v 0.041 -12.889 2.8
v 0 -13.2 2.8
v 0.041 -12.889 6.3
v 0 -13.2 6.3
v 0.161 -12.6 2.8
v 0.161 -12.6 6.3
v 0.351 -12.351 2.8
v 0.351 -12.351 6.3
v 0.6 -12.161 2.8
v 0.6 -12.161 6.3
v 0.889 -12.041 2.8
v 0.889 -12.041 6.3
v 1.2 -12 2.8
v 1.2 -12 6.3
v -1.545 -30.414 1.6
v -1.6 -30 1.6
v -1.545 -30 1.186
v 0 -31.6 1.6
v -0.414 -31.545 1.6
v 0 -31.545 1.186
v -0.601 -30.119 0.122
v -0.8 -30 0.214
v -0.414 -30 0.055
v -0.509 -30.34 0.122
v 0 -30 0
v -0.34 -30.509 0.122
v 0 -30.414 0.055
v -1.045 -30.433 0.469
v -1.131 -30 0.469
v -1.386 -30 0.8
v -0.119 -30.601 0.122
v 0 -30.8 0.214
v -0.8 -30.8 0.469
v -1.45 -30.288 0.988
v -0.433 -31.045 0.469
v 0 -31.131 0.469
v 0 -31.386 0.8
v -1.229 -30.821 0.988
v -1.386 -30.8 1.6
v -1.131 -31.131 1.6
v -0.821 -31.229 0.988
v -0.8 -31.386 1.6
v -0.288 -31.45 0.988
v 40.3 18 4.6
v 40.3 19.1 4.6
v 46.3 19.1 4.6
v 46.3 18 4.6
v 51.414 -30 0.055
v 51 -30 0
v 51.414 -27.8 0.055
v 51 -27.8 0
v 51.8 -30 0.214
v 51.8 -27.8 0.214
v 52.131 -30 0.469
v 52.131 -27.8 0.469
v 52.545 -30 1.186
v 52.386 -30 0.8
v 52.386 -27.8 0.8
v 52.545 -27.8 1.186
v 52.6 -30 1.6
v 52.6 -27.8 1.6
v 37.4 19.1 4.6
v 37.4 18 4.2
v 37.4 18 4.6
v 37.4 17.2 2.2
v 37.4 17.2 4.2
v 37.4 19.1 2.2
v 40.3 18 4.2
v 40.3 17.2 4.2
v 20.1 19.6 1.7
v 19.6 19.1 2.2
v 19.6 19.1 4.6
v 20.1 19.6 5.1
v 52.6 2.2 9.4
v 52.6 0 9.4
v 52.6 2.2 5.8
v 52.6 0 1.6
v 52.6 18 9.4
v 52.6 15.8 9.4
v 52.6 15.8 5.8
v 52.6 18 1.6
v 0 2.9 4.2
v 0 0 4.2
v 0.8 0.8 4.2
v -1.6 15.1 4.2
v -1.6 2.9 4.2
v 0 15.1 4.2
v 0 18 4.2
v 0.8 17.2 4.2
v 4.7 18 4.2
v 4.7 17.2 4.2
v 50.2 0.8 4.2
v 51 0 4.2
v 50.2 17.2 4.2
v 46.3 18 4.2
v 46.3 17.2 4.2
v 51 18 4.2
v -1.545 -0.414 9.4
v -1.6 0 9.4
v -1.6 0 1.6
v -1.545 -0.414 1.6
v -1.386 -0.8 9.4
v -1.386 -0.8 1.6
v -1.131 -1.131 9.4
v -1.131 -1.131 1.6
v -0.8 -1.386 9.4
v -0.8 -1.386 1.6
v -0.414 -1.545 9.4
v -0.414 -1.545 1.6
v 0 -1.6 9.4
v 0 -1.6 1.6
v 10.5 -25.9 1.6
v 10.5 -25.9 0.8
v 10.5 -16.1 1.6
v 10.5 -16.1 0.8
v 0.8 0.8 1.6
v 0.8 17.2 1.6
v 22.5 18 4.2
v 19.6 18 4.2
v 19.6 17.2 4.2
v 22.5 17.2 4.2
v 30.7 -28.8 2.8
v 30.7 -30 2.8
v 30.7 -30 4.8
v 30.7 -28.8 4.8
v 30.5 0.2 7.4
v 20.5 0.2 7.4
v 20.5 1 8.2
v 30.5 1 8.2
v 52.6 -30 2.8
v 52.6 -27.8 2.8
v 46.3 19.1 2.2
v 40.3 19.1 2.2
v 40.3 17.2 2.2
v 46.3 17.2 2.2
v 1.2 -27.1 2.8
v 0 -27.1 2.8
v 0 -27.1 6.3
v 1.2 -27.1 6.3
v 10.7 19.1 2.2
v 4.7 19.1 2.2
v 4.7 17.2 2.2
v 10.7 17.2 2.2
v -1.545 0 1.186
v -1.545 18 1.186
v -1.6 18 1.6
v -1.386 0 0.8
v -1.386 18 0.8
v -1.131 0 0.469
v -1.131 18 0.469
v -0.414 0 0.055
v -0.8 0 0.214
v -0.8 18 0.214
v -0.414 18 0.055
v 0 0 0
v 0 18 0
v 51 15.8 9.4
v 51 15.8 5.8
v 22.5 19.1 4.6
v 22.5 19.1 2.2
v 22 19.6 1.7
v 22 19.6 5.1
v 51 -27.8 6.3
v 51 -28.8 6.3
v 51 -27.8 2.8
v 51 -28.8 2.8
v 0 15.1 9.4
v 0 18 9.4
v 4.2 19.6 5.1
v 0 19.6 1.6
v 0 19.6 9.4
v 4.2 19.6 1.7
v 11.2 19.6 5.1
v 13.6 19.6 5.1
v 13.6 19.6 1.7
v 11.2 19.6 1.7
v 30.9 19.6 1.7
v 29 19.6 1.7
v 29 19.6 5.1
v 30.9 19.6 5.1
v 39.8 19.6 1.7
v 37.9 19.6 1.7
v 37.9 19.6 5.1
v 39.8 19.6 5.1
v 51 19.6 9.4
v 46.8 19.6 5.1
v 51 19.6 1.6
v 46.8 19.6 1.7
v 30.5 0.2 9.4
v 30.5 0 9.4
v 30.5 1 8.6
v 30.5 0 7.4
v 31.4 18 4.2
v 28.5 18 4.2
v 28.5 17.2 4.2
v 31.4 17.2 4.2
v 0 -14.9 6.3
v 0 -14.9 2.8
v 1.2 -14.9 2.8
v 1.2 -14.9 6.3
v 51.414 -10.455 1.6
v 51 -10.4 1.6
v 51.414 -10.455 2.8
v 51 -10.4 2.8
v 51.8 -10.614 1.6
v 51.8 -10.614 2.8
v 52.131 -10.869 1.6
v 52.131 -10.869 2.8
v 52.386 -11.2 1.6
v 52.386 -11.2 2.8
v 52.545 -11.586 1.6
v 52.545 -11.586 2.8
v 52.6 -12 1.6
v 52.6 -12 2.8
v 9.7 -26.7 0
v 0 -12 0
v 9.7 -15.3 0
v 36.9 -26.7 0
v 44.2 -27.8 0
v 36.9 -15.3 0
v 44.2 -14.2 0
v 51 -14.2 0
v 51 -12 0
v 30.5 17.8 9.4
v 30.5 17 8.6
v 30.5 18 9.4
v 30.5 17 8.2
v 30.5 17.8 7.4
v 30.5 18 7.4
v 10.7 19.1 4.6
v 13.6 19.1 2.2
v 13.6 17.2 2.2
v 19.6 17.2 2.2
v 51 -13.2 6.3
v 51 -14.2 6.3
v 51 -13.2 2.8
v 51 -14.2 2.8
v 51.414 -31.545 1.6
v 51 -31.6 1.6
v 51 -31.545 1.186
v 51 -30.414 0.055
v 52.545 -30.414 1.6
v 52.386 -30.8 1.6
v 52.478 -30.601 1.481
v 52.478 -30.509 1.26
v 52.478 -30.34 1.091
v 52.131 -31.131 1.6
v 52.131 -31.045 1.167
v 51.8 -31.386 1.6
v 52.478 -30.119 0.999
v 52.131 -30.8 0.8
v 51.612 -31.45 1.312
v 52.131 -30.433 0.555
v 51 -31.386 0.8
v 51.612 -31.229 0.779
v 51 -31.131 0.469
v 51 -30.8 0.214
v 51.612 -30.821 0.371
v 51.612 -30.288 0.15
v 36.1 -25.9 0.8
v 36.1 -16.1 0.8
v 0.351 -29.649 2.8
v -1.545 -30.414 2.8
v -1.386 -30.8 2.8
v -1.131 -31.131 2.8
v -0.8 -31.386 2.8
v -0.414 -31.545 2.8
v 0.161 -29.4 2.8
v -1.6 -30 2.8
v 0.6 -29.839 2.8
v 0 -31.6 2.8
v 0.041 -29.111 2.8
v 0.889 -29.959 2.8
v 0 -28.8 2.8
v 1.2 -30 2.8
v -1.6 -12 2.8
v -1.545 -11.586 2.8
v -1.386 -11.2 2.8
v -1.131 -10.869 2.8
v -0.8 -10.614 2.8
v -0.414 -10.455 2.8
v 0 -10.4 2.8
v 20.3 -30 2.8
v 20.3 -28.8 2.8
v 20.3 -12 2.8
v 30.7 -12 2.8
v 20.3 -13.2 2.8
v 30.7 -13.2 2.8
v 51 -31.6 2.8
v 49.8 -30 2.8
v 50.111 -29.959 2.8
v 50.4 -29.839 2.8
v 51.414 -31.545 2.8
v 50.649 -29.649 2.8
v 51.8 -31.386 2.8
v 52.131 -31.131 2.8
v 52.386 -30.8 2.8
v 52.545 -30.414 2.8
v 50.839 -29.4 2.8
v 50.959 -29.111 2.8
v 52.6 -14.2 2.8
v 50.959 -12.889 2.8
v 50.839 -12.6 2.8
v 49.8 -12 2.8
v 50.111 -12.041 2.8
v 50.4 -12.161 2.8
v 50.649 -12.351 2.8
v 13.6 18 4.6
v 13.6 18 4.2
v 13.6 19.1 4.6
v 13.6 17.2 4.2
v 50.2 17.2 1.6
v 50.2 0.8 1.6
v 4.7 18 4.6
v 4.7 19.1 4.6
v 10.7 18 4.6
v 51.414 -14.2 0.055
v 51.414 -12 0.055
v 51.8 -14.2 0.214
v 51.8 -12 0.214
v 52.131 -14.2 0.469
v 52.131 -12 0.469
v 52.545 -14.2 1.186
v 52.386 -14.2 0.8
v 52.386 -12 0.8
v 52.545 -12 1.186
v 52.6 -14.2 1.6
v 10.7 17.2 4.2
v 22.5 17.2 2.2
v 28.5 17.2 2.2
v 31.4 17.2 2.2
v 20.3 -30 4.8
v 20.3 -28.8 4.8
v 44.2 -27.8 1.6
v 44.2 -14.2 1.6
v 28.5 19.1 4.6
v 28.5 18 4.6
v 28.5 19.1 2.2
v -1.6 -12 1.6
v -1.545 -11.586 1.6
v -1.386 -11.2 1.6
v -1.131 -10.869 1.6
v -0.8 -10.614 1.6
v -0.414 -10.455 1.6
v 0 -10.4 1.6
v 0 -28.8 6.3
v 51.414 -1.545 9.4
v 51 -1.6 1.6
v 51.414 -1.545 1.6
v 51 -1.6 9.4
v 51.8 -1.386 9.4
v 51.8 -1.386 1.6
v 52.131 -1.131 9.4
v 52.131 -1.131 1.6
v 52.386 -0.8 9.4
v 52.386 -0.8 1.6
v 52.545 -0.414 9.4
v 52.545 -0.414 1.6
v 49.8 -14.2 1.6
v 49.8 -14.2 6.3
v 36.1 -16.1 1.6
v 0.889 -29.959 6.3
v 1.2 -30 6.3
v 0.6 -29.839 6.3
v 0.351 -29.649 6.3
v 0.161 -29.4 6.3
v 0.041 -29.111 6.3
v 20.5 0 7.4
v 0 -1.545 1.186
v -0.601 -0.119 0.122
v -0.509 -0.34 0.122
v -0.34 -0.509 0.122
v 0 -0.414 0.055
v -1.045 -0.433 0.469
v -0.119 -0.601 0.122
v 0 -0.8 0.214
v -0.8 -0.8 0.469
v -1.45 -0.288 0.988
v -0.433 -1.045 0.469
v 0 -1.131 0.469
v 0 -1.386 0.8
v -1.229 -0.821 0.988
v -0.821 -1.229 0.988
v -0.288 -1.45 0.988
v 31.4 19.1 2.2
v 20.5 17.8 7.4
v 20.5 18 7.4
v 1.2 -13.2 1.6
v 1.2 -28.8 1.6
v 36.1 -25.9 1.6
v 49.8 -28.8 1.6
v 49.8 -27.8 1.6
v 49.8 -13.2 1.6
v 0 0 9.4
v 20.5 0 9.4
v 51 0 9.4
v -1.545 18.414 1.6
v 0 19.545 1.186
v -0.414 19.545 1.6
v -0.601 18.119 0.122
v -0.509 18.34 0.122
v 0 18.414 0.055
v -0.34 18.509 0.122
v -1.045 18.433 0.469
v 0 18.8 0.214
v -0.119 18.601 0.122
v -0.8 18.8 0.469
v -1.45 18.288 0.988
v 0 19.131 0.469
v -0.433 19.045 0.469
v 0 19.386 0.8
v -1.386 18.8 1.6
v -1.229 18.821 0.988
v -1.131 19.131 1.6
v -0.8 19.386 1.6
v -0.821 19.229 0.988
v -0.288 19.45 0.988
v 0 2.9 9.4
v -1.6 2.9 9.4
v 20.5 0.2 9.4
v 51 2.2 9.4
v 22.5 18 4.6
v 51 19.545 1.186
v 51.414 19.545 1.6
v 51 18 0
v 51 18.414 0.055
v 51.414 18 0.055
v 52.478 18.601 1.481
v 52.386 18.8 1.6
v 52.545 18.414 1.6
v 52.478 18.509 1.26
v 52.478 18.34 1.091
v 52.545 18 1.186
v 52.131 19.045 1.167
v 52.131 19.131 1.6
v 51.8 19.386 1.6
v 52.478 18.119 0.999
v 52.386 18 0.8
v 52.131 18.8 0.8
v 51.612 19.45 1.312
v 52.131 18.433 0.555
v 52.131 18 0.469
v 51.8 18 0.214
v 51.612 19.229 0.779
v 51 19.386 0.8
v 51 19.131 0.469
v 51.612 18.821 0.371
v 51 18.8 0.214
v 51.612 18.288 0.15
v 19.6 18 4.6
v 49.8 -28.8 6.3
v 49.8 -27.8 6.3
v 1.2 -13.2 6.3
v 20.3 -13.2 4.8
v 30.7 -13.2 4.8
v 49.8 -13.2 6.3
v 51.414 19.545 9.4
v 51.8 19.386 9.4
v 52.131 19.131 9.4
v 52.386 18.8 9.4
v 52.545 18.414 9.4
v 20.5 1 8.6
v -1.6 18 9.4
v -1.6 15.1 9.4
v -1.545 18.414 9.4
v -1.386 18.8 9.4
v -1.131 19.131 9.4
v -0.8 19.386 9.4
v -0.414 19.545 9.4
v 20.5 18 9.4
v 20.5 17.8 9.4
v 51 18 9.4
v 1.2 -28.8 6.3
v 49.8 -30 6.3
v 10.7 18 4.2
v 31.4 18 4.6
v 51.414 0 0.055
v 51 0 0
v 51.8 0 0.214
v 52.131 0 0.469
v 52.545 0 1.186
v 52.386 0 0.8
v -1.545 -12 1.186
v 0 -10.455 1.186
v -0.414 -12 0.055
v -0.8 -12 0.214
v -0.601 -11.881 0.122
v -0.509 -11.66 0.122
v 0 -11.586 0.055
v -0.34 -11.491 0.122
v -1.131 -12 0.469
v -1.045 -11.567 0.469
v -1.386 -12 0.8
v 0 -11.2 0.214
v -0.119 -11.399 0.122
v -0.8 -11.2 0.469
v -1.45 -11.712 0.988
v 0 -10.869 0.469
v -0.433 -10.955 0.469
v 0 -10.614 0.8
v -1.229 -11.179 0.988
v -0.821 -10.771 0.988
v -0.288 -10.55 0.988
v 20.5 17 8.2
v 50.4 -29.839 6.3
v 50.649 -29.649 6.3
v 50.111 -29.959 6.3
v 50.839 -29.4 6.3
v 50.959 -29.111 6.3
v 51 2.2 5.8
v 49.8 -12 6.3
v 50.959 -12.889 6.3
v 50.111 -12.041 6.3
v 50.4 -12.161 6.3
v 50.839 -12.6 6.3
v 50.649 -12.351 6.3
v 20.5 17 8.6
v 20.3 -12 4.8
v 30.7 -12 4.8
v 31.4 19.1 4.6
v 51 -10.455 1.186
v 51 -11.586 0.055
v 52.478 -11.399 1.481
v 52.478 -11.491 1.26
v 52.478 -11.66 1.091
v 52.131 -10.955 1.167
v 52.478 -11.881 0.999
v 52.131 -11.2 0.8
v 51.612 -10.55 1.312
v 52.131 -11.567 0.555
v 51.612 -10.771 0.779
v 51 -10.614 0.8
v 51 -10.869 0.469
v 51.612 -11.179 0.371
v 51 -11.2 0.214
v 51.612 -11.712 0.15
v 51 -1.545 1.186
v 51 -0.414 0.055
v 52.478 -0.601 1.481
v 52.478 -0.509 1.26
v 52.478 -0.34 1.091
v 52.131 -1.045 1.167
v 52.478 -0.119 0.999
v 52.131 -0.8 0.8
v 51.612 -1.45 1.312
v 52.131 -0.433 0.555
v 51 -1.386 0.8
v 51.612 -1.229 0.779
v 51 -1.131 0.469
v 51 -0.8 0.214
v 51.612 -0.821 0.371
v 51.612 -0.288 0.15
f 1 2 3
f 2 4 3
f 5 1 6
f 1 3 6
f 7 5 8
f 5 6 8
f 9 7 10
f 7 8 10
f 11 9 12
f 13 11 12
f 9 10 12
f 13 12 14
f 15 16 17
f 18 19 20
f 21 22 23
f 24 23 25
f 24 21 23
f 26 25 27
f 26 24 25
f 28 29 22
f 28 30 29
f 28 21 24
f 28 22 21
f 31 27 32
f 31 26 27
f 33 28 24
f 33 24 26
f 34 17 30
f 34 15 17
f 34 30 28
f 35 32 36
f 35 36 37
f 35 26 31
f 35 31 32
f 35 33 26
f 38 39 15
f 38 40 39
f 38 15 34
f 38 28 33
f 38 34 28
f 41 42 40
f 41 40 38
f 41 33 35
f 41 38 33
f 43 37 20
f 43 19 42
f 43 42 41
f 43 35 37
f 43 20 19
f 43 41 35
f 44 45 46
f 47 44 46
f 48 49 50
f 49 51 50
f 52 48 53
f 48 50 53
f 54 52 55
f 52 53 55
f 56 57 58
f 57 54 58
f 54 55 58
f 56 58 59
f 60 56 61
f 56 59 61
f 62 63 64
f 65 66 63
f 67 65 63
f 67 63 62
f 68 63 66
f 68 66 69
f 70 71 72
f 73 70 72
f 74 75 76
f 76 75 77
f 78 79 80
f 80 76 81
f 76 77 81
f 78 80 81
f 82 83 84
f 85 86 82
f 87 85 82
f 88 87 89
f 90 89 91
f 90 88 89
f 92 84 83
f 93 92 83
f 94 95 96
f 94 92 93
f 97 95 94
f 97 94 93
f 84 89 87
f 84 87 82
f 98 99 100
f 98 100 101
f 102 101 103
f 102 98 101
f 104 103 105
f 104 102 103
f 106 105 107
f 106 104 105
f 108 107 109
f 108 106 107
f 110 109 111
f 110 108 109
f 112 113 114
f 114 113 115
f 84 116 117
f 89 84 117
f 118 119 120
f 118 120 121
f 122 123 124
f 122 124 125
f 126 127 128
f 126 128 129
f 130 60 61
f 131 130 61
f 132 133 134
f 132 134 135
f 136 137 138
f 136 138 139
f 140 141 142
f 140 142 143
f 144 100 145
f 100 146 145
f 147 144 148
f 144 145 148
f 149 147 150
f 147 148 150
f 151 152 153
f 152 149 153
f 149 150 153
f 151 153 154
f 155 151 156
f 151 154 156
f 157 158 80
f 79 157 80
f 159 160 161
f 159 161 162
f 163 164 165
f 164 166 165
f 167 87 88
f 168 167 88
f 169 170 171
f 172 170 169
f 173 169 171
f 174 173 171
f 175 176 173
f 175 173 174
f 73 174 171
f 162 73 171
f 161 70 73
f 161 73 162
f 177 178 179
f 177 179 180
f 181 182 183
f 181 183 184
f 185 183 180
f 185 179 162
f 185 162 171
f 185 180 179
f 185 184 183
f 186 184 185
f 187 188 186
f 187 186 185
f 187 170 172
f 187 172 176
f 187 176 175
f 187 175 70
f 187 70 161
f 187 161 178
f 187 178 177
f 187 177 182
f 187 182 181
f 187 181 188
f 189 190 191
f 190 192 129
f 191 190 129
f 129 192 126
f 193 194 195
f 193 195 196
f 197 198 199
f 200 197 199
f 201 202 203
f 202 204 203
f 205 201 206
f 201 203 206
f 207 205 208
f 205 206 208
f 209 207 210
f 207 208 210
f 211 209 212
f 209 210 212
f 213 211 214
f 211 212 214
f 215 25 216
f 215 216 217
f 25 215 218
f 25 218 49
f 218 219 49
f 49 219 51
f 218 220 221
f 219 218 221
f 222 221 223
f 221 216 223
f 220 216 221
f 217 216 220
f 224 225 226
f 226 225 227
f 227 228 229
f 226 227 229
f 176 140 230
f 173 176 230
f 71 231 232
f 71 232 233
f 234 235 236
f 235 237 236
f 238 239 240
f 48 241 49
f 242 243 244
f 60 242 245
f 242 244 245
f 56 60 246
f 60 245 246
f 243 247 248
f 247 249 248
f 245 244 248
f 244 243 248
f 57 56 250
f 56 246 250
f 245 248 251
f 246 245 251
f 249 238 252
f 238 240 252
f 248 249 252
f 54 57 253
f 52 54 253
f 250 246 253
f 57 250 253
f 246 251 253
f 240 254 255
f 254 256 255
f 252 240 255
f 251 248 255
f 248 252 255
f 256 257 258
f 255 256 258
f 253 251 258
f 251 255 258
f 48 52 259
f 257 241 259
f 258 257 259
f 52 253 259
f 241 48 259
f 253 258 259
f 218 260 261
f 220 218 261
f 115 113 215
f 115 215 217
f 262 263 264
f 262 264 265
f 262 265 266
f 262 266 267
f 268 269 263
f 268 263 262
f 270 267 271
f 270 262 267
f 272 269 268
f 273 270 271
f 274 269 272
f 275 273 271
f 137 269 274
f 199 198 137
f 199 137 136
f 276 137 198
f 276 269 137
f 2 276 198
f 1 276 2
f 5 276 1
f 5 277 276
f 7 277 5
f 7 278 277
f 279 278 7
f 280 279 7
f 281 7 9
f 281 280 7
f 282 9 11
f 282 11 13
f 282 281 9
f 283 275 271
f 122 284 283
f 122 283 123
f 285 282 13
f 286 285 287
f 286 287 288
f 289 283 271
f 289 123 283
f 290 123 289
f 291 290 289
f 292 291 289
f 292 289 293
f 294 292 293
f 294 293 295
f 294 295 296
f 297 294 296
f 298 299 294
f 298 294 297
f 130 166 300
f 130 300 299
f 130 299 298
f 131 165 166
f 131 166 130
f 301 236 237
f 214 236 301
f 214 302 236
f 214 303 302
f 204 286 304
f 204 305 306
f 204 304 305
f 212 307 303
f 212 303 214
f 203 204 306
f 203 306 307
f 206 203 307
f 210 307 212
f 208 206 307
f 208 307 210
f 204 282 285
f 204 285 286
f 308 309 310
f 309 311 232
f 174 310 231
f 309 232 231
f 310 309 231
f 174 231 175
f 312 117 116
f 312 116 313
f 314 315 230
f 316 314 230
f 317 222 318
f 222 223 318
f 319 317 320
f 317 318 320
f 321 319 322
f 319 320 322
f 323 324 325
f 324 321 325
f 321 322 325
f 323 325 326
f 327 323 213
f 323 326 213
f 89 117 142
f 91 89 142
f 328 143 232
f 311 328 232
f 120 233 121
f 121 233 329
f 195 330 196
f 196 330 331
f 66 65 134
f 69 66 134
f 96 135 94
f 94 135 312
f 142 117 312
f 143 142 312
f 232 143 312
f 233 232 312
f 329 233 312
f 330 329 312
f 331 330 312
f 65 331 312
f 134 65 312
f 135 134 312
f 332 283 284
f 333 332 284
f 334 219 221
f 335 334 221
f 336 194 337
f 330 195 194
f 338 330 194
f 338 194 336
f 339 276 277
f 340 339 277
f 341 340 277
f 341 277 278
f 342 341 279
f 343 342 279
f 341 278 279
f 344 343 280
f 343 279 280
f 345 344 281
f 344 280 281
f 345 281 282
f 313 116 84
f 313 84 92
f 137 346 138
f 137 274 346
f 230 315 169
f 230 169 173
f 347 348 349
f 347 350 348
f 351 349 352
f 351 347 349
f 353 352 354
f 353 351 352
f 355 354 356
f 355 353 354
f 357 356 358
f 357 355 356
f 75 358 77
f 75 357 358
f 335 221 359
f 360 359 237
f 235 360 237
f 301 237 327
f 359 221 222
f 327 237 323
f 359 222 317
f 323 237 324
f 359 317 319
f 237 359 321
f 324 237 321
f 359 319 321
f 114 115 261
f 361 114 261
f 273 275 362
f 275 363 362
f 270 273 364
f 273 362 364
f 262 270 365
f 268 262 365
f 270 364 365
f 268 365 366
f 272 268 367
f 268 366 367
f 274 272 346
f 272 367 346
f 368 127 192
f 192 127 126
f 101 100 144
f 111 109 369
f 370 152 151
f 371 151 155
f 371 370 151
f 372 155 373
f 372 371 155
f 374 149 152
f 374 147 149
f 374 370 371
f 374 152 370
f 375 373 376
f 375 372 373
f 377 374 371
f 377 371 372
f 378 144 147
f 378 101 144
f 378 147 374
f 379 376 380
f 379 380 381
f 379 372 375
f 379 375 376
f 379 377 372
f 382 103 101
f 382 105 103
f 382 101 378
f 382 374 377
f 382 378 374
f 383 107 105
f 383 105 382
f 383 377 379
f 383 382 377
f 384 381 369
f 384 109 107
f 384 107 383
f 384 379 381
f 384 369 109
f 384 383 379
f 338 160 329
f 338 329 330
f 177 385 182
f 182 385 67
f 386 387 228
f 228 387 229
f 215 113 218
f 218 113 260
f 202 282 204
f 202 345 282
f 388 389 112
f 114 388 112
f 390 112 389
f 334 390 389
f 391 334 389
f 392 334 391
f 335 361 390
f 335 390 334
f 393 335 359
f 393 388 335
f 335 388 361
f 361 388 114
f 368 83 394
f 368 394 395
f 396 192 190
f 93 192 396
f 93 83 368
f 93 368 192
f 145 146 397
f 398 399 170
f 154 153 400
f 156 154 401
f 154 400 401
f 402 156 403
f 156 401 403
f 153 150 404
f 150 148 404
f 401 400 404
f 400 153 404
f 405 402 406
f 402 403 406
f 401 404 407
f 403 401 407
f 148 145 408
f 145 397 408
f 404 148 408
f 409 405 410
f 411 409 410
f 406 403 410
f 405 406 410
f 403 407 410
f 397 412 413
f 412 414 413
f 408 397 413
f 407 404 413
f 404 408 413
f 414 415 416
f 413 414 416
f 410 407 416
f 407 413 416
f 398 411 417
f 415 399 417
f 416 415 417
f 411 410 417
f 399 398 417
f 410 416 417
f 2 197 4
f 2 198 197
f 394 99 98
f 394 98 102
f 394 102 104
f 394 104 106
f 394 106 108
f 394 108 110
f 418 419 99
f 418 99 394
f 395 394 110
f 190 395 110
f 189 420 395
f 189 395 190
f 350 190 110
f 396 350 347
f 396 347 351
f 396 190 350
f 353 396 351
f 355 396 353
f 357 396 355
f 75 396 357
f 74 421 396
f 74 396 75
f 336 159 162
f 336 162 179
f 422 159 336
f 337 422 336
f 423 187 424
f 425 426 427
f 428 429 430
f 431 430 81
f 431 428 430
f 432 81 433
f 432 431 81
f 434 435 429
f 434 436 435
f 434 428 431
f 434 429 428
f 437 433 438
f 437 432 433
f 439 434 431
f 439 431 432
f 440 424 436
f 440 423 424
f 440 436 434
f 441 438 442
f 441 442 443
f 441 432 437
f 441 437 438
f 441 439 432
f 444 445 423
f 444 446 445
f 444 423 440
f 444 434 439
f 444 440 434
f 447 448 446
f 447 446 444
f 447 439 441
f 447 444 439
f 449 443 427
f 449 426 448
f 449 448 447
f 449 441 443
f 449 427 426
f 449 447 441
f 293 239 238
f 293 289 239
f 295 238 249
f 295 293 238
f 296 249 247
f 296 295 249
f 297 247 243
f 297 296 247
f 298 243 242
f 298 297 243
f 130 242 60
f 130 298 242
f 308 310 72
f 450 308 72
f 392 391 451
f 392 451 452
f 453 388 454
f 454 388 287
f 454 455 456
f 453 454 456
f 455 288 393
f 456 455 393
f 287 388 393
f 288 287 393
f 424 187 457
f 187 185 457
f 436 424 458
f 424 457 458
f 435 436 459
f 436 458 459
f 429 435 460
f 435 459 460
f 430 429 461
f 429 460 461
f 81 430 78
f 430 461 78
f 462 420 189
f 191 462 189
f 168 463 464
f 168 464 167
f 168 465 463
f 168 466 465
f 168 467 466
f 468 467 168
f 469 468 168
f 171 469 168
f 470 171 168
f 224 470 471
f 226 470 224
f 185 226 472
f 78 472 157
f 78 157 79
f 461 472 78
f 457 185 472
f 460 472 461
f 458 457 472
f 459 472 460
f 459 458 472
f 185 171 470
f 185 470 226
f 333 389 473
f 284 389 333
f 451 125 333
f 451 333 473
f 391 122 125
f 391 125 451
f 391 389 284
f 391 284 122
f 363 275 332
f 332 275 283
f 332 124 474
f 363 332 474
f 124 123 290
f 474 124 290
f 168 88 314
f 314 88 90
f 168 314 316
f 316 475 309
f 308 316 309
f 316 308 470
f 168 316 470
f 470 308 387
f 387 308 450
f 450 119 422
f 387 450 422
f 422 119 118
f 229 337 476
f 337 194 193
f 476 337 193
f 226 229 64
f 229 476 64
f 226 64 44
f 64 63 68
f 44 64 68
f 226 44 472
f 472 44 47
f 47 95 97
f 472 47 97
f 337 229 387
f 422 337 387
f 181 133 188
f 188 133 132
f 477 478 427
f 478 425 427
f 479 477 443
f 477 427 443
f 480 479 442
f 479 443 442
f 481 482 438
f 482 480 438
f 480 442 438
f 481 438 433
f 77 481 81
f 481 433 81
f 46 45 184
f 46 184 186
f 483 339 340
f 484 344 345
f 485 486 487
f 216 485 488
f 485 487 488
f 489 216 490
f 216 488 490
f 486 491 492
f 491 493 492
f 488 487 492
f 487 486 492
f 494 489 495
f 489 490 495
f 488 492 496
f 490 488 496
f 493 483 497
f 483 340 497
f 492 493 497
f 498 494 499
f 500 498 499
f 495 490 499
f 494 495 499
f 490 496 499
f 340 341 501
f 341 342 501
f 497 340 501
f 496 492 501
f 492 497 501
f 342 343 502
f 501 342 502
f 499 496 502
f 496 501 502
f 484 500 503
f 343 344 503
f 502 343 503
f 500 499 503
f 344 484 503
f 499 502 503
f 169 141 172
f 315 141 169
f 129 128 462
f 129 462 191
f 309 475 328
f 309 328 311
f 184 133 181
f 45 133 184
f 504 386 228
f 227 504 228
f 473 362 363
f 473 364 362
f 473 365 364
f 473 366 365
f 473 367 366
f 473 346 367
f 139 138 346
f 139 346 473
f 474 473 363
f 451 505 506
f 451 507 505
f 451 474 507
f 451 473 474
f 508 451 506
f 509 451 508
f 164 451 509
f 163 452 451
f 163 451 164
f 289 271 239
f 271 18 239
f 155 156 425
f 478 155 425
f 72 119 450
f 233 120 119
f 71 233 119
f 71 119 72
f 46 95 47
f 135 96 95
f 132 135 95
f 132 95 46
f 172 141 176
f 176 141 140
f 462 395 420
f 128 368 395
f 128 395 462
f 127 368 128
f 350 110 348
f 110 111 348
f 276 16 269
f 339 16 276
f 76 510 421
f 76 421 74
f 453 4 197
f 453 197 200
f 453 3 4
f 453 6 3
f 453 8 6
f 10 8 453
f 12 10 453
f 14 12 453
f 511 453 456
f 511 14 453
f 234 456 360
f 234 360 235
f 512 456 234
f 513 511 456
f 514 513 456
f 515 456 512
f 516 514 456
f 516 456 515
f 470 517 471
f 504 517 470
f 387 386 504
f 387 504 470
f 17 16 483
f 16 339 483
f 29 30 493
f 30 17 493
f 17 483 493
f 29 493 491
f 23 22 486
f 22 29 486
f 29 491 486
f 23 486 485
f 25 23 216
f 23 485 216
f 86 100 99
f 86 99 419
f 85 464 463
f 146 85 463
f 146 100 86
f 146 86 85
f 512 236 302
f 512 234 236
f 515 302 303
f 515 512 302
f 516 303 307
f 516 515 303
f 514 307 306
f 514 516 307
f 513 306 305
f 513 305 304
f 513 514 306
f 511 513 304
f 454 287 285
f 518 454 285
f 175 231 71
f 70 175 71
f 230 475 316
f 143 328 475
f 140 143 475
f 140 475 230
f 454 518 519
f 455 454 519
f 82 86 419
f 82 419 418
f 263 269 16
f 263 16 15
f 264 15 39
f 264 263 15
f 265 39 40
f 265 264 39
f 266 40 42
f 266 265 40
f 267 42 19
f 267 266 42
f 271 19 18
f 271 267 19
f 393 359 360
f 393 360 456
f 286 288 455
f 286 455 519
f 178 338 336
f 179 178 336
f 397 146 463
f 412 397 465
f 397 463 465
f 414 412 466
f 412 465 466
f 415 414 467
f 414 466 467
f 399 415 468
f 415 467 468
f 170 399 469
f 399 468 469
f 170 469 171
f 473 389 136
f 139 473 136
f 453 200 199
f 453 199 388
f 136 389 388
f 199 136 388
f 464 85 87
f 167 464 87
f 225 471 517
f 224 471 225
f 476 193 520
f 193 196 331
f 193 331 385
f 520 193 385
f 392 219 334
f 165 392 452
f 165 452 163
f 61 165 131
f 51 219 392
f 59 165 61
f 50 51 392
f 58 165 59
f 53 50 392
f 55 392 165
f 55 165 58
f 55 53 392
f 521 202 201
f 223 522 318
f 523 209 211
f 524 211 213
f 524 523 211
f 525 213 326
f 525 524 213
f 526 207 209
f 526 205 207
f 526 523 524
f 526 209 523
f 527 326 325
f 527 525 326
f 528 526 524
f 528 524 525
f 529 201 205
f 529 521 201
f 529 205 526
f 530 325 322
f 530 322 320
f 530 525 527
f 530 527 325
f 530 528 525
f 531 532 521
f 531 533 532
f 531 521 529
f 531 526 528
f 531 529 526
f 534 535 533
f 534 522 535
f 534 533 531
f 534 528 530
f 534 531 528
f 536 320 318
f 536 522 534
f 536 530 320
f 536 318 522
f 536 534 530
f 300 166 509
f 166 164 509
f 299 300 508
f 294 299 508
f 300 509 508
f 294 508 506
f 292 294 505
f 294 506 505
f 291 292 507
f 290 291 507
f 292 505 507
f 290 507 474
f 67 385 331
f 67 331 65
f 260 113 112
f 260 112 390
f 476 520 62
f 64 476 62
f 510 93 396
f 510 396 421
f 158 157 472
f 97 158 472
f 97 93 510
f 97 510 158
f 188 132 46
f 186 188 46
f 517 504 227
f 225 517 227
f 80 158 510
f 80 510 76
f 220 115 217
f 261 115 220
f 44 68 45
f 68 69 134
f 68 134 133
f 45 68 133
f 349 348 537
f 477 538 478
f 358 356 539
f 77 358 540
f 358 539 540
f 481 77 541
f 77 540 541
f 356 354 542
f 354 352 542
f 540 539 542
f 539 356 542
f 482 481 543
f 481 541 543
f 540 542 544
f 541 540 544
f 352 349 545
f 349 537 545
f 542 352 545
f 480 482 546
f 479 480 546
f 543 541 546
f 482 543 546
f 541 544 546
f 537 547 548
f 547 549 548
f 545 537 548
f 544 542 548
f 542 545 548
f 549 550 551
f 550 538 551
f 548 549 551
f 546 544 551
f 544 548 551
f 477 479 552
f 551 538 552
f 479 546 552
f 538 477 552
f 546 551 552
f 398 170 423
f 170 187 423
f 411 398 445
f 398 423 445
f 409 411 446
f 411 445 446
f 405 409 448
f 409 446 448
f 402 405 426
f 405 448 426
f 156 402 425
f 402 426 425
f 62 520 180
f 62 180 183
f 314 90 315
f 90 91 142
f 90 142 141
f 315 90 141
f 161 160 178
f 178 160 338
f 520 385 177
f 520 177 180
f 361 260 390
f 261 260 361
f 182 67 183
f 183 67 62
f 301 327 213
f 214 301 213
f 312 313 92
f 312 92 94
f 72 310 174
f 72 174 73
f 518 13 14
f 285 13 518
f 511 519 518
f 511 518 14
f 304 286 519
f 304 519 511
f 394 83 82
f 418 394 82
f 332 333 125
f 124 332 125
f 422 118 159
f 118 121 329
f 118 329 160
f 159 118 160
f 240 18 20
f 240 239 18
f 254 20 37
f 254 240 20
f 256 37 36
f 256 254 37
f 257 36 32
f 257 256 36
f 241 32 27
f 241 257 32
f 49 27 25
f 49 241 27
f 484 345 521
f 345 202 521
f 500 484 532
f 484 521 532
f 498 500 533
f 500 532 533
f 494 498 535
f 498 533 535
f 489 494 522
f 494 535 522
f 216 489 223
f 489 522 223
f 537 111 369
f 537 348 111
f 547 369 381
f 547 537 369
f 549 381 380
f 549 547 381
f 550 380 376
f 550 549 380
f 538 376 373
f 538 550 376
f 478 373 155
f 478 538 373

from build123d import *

# Parameters (mm, degrees)
BOX007_W        = 10
BOX007_H        = 13.6
BOX007_DEPTH    = 10
BOX008_W        = 6
BOX008_H        = 10
BOX008_DEPTH    = 2.4
BOX009_W        = 6
BOX009_H        = 10
BOX009_DEPTH    = 2.4
BOX019_W        = 6
BOX019_H        = 10
BOX019_DEPTH    = 2.4
BOX020_W        = 6
BOX020_H        = 10
BOX020_DEPTH    = 2.4
BOX021_W        = 6
BOX021_H        = 10
BOX021_DEPTH    = 2.4
BOX006_W        = 10
BOX006_H        = 12.2
BOX006_DEPTH    = 5.2
BOX003_W        = 49.4
BOX003_H        = 16.4
BOX003_DEPTH    = 2.6
BOX002_W        = 51
BOX002_H        = 18
BOX002_DEPTH    = 2.6
BOX005_W        = 10
BOX005_H        = 1
BOX005_DEPTH    = 2
CHAMFER001_SIZE = 0.8
BOX004_W        = 10
BOX004_H        = 1
BOX004_DEPTH    = 2
CHAMFER_SIZE    = 0.8
BOX001_W        = 51
BOX001_H        = 18
BOX001_DEPTH    = 9.4
BOX_W           = 54.2
BOX_H           = 21.2
BOX_DEPTH       = 9.4
FILLET_R        = 1.6
CHAMFER002_SIZE = 0.5
BOX015_W        = 10
BOX015_H        = 12.2
BOX015_DEPTH    = 5.2
BOX016_W        = 10
BOX016_H        = 13.6
BOX016_DEPTH    = 10
BOX017_W        = 10.4
BOX017_H        = 5
BOX017_DEPTH    = 2
BOX018_W        = 10.4
BOX018_H        = 5
BOX018_DEPTH    = 2
BOX014_W        = 25.6
BOX014_H        = 9.8
BOX014_DEPTH    = 1.6
BOX013_W        = 48.6
BOX013_H        = 15.6
BOX013_DEPTH    = 4.8
BOX012_W        = 51
BOX012_H        = 18
BOX012_DEPTH    = 4.7
BOX011_W        = 51
BOX011_H        = 18
BOX011_DEPTH    = 9.4
BOX010_W        = 54.2
BOX010_H        = 21.2
BOX010_DEPTH    = 2.8
FILLET001_R     = 1.6
CHAMFER003_SIZE = 0.8
FILLET002_R     = 1.2


with BuildPart() as usb_buchse:
    # Box007 → Box007 (new body)
    with BuildSketch(Plane(origin=(48, 2.2, 5.8), x_dir=(1, 0, 0), z_dir=(0, 0, 1))):
        with Locations((5, 6.8)):
            Rectangle(BOX007_W, BOX007_H)
    extrude(amount=BOX007_DEPTH)


with BuildPart() as button1:
    # Box008 → Box008 (new body)
    with BuildSketch(Plane(origin=(4.7, 14, 2.2), x_dir=(1, 0, 0), z_dir=(0, 0, 1))):
        with Locations((3, 5)):
            Rectangle(BOX008_W, BOX008_H)
    extrude(amount=BOX008_DEPTH)


with BuildPart() as button2:
    # Box009 → Box009 (new body)
    with BuildSketch(Plane(origin=(13.6, 14, 2.2), x_dir=(1, 0, 0), z_dir=(0, 0, 1))):
        with Locations((3, 5)):
            Rectangle(BOX009_W, BOX009_H)
    extrude(amount=BOX009_DEPTH)


with BuildPart() as button3:
    # Box019 → Box019 (new body)
    with BuildSketch(Plane(origin=(22.5, 14, 2.2), x_dir=(1, 0, 0), z_dir=(0, 0, 1))):
        with Locations((3, 5)):
            Rectangle(BOX019_W, BOX019_H)
    extrude(amount=BOX019_DEPTH)


with BuildPart() as button4:
    # Box020 → Box020 (new body)
    with BuildSketch(Plane(origin=(31.4, 14, 2.2), x_dir=(1, 0, 0), z_dir=(0, 0, 1))):
        with Locations((3, 5)):
            Rectangle(BOX020_W, BOX020_H)
    extrude(amount=BOX020_DEPTH)


with BuildPart() as button5:
    # Box021 → Box021 (new body)
    with BuildSketch(Plane(origin=(40.3, 14, 2.2), x_dir=(1, 0, 0), z_dir=(0, 0, 1))):
        with Locations((3, 5)):
            Rectangle(BOX021_W, BOX021_H)
    extrude(amount=BOX021_DEPTH)


with BuildPart() as bottom_cutouts:
    # Box006 → Box006 (new body)
    with BuildSketch(Plane(origin=(-5, 2.9, 4.2), x_dir=(1, 0, 0), z_dir=(0, 0, 1))):
        with Locations((5, 6.1)):
            Rectangle(BOX006_W, BOX006_H)
    extrude(amount=BOX006_DEPTH)

    # Fusion001: union USB_Buchse, Button1, Button2, Button3, Button4, Button5
    add(usb_buchse.part)
    add(button1.part)
    add(button2.part)
    add(button3.part)
    add(button4.part)
    add(button5.part)


with BuildPart() as auflage_innen:
    # Box003 → Box003 (new body)
    with BuildSketch(Plane(origin=(0.8, 0.8, 1.6), x_dir=(1, 0, 0), z_dir=(0, 0, 1))):
        with Locations((24.7, 8.2)):
            Rectangle(BOX003_W, BOX003_H)
    extrude(amount=BOX003_DEPTH)


with BuildPart() as auflage:
    # Box002 → Box002 (new body)
    with BuildSketch(Plane.XY.offset(1.6)):
        with Locations((25.5, 9)):
            Rectangle(BOX002_W, BOX002_H)
    extrude(amount=BOX002_DEPTH)

    # Cut001: cut Auflage_innen
    add(auflage_innen.part, mode=Mode.SUBTRACT)


with BuildPart() as haken2:
    # Box005 → Box005 (new body)
    with BuildSketch(Plane(origin=(20.5, 17, 7.4), x_dir=(1, 0, 0), z_dir=(0, 0, 1))):
        with Locations((5, 0.5)):
            Rectangle(BOX005_W, BOX005_H)
    extrude(amount=BOX005_DEPTH)

    # Chamfer001
    chamfer001_edges = [haken2.edges().sort_by_distance(p)[0] for p in [
        (25.5, 17, 7.4),
        (25.5, 17, 9.4),
    ]]
    chamfer(chamfer001_edges, length=CHAMFER001_SIZE)


with BuildPart() as haken1:
    # Box004 → Box004 (new body)
    with BuildSketch(Plane(origin=(20.5, 0, 7.4), x_dir=(1, 0, 0), z_dir=(0, 0, 1))):
        with Locations((5, 0.5)):
            Rectangle(BOX004_W, BOX004_H)
    extrude(amount=BOX004_DEPTH)

    # Chamfer
    chamfer_edges = [haken1.edges().sort_by_distance(p)[0] for p in [
        (25.5, 1, 7.4),
        (25.5, 1, 9.4),
    ]]
    chamfer(chamfer_edges, length=CHAMFER_SIZE)


with BuildPart() as unten_innen:
    # Box001 → Box001 (new body)
    with BuildSketch(Plane.XY.offset(1.6)):
        with Locations((25.5, 9)):
            Rectangle(BOX001_W, BOX001_H)
    extrude(amount=BOX001_DEPTH)


with BuildPart() as case_bottom:
    # Box → Box (new body)
    with BuildSketch(Plane(origin=(-1.6, -1.6, 0), x_dir=(1, 0, 0), z_dir=(0, 0, 1))):
        with Locations((27.1, 10.6)):
            Rectangle(BOX_W, BOX_H)
    extrude(amount=BOX_DEPTH)

    # Cut: cut unten_innen
    add(unten_innen.part, mode=Mode.SUBTRACT)

    # Fillet
    fillet_edges = [case_bottom.edges().sort_by_distance(p)[0] for p in [
        (-1.6, -1.6, 4.7),
        (-1.6, 19.6, 4.7),
        (-1.6, 9, 0),
        (25.5, -1.6, 0),
        (52.6, -1.6, 4.7),
        (25.5, 19.6, 0),
        (52.6, 19.6, 4.7),
        (52.6, 9, 0),
    ]]
    fillet(fillet_edges, radius=FILLET_R)

    # Fusion: union Auflage, Haken2, Haken1
    add(auflage.part)
    add(haken2.part)
    add(haken1.part)

    # Cut004: cut bottom_cutouts
    add(bottom_cutouts.part, mode=Mode.SUBTRACT)

    # Chamfer002
    chamfer002_edges = [case_bottom.edges().sort_by_distance(p)[0] for p in [
        (43.3, 19.6, 4.6),
        (46.3, 19.6, 3.4),
        (43.3, 19.6, 2.2),
        (40.3, 19.6, 3.4),
        (34.4, 19.6, 4.6),
        (37.4, 19.6, 3.4),
        (34.4, 19.6, 2.2),
        (31.4, 19.6, 3.4),
        (16.6, 19.6, 4.6),
        (19.6, 19.6, 3.4),
        (16.6, 19.6, 2.2),
        (25.5, 19.6, 4.6),
        (28.5, 19.6, 3.4),
        (25.5, 19.6, 2.2),
        (22.5, 19.6, 3.4),
        (7.7, 19.6, 4.6),
        (10.7, 19.6, 3.4),
        (7.7, 19.6, 2.2),
        (4.7, 19.6, 3.4),
    ]]
    chamfer(chamfer002_edges, length=CHAMFER002_SIZE)


with BuildPart() as usb_stecker2:
    # Box015 → Box015 (new body)
    with BuildSketch(Plane(origin=(-5, -27.1, 2.8), x_dir=(1, 0, 0), z_dir=(0, 0, 1))):
        with Locations((5, 6.1)):
            Rectangle(BOX015_W, BOX015_H)
    extrude(amount=BOX015_DEPTH)


with BuildPart() as usb_buchse2:
    # Box016 → Box016 (new body)
    with BuildSketch(Plane(origin=(44.2, -27.8, 0), x_dir=(1, 0, 0), z_dir=(0, 0, 1))):
        with Locations((5, 6.8)):
            Rectangle(BOX016_W, BOX016_H)
    extrude(amount=BOX016_DEPTH)


with BuildPart() as oese1:
    # Box017 → Box017 (new body)
    with BuildSketch(Plane(origin=(20.3, -33, 2.8), x_dir=(1, 0, 0), z_dir=(0, 0, 1))):
        with Locations((5.2, 2.5)):
            Rectangle(BOX017_W, BOX017_H)
    extrude(amount=BOX017_DEPTH)


with BuildPart() as oese2:
    # Box018 → Box018 (new body)
    with BuildSketch(Plane(origin=(20.3, -15, 2.8), x_dir=(1, 0, 0), z_dir=(0, 0, 1))):
        with Locations((5.2, 2.5)):
            Rectangle(BOX018_W, BOX018_H)
    extrude(amount=BOX018_DEPTH)


with BuildPart() as top_cutouts:
    # Box014 → Box014 (new body)
    with BuildSketch(Plane(origin=(10.5, -25.9, 0), x_dir=(1, 0, 0), z_dir=(0, 0, 1))):
        with Locations((12.8, 4.9)):
            Rectangle(BOX014_W, BOX014_H)
    extrude(amount=BOX014_DEPTH)

    # Fusion003: union USB_Stecker2, USB_Buchse2, Oese1, Oese2
    add(usb_stecker2.part)
    add(usb_buchse2.part)
    add(oese1.part)
    add(oese2.part)


with BuildPart() as rahmen_innen:
    # Box013 → Box013 (new body)
    with BuildSketch(Plane(origin=(1.2, -28.8, 1.6), x_dir=(1, 0, 0), z_dir=(0, 0, 1))):
        with Locations((24.3, 7.8)):
            Rectangle(BOX013_W, BOX013_H)
    extrude(amount=BOX013_DEPTH)


with BuildPart() as rahmen:
    # Box012 → Box012 (new body)
    with BuildSketch(Plane(origin=(0, -30, 1.6), x_dir=(1, 0, 0), z_dir=(0, 0, 1))):
        with Locations((25.5, 9)):
            Rectangle(BOX012_W, BOX012_H)
    extrude(amount=BOX012_DEPTH)

    # Cut003: cut Rahmen_innen
    add(rahmen_innen.part, mode=Mode.SUBTRACT)


with BuildPart() as oben_innen:
    # Box011 → Box011 (new body)
    with BuildSketch(Plane(origin=(0, -30, 1.6), x_dir=(1, 0, 0), z_dir=(0, 0, 1))):
        with Locations((25.5, 9)):
            Rectangle(BOX011_W, BOX011_H)
    extrude(amount=BOX011_DEPTH)


with BuildPart() as case_top:
    # Box010 → Box010 (new body)
    with BuildSketch(Plane(origin=(-1.6, -31.6, 0), x_dir=(1, 0, 0), z_dir=(0, 0, 1))):
        with Locations((27.1, 10.6)):
            Rectangle(BOX010_W, BOX010_H)
    extrude(amount=BOX010_DEPTH)

    # Cut002: cut oben_innen
    add(oben_innen.part, mode=Mode.SUBTRACT)

    # Fillet001
    fillet001_edges = [case_top.edges().sort_by_distance(p)[0] for p in [
        (-1.6, -31.6, 1.4),
        (-1.6, -10.4, 1.4),
        (-1.6, -21, 0),
        (25.5, -31.6, 0),
        (52.6, -31.6, 1.4),
        (25.5, -10.4, 0),
        (52.6, -10.4, 1.4),
        (52.6, -21, 0),
    ]]
    fillet(fillet001_edges, radius=FILLET001_R)

    # Fusion002: union Rahmen
    add(rahmen.part)

    # Cut005: cut top_cutouts
    add(top_cutouts.part, mode=Mode.SUBTRACT)

    # Chamfer003
    chamfer003_edges = [case_top.edges().sort_by_distance(p)[0] for p in [
        (23.3, -16.1, 0),
        (10.5, -21, 0),
        (23.3, -25.9, 0),
        (36.1, -21, 0),
    ]]
    chamfer(chamfer003_edges, length=CHAMFER003_SIZE)

    # Fillet002
    fillet002_edges = [case_top.edges().sort_by_distance(p)[0] for p in [
        (51, -12, 4.55),
        (51, -30, 4.55),
        (0, -12, 4.55),
        (0, -30, 4.55),
    ]]
    fillet(fillet002_edges, radius=FILLET002_R)


solid = Compound([case_bottom.part, case_top.part])
